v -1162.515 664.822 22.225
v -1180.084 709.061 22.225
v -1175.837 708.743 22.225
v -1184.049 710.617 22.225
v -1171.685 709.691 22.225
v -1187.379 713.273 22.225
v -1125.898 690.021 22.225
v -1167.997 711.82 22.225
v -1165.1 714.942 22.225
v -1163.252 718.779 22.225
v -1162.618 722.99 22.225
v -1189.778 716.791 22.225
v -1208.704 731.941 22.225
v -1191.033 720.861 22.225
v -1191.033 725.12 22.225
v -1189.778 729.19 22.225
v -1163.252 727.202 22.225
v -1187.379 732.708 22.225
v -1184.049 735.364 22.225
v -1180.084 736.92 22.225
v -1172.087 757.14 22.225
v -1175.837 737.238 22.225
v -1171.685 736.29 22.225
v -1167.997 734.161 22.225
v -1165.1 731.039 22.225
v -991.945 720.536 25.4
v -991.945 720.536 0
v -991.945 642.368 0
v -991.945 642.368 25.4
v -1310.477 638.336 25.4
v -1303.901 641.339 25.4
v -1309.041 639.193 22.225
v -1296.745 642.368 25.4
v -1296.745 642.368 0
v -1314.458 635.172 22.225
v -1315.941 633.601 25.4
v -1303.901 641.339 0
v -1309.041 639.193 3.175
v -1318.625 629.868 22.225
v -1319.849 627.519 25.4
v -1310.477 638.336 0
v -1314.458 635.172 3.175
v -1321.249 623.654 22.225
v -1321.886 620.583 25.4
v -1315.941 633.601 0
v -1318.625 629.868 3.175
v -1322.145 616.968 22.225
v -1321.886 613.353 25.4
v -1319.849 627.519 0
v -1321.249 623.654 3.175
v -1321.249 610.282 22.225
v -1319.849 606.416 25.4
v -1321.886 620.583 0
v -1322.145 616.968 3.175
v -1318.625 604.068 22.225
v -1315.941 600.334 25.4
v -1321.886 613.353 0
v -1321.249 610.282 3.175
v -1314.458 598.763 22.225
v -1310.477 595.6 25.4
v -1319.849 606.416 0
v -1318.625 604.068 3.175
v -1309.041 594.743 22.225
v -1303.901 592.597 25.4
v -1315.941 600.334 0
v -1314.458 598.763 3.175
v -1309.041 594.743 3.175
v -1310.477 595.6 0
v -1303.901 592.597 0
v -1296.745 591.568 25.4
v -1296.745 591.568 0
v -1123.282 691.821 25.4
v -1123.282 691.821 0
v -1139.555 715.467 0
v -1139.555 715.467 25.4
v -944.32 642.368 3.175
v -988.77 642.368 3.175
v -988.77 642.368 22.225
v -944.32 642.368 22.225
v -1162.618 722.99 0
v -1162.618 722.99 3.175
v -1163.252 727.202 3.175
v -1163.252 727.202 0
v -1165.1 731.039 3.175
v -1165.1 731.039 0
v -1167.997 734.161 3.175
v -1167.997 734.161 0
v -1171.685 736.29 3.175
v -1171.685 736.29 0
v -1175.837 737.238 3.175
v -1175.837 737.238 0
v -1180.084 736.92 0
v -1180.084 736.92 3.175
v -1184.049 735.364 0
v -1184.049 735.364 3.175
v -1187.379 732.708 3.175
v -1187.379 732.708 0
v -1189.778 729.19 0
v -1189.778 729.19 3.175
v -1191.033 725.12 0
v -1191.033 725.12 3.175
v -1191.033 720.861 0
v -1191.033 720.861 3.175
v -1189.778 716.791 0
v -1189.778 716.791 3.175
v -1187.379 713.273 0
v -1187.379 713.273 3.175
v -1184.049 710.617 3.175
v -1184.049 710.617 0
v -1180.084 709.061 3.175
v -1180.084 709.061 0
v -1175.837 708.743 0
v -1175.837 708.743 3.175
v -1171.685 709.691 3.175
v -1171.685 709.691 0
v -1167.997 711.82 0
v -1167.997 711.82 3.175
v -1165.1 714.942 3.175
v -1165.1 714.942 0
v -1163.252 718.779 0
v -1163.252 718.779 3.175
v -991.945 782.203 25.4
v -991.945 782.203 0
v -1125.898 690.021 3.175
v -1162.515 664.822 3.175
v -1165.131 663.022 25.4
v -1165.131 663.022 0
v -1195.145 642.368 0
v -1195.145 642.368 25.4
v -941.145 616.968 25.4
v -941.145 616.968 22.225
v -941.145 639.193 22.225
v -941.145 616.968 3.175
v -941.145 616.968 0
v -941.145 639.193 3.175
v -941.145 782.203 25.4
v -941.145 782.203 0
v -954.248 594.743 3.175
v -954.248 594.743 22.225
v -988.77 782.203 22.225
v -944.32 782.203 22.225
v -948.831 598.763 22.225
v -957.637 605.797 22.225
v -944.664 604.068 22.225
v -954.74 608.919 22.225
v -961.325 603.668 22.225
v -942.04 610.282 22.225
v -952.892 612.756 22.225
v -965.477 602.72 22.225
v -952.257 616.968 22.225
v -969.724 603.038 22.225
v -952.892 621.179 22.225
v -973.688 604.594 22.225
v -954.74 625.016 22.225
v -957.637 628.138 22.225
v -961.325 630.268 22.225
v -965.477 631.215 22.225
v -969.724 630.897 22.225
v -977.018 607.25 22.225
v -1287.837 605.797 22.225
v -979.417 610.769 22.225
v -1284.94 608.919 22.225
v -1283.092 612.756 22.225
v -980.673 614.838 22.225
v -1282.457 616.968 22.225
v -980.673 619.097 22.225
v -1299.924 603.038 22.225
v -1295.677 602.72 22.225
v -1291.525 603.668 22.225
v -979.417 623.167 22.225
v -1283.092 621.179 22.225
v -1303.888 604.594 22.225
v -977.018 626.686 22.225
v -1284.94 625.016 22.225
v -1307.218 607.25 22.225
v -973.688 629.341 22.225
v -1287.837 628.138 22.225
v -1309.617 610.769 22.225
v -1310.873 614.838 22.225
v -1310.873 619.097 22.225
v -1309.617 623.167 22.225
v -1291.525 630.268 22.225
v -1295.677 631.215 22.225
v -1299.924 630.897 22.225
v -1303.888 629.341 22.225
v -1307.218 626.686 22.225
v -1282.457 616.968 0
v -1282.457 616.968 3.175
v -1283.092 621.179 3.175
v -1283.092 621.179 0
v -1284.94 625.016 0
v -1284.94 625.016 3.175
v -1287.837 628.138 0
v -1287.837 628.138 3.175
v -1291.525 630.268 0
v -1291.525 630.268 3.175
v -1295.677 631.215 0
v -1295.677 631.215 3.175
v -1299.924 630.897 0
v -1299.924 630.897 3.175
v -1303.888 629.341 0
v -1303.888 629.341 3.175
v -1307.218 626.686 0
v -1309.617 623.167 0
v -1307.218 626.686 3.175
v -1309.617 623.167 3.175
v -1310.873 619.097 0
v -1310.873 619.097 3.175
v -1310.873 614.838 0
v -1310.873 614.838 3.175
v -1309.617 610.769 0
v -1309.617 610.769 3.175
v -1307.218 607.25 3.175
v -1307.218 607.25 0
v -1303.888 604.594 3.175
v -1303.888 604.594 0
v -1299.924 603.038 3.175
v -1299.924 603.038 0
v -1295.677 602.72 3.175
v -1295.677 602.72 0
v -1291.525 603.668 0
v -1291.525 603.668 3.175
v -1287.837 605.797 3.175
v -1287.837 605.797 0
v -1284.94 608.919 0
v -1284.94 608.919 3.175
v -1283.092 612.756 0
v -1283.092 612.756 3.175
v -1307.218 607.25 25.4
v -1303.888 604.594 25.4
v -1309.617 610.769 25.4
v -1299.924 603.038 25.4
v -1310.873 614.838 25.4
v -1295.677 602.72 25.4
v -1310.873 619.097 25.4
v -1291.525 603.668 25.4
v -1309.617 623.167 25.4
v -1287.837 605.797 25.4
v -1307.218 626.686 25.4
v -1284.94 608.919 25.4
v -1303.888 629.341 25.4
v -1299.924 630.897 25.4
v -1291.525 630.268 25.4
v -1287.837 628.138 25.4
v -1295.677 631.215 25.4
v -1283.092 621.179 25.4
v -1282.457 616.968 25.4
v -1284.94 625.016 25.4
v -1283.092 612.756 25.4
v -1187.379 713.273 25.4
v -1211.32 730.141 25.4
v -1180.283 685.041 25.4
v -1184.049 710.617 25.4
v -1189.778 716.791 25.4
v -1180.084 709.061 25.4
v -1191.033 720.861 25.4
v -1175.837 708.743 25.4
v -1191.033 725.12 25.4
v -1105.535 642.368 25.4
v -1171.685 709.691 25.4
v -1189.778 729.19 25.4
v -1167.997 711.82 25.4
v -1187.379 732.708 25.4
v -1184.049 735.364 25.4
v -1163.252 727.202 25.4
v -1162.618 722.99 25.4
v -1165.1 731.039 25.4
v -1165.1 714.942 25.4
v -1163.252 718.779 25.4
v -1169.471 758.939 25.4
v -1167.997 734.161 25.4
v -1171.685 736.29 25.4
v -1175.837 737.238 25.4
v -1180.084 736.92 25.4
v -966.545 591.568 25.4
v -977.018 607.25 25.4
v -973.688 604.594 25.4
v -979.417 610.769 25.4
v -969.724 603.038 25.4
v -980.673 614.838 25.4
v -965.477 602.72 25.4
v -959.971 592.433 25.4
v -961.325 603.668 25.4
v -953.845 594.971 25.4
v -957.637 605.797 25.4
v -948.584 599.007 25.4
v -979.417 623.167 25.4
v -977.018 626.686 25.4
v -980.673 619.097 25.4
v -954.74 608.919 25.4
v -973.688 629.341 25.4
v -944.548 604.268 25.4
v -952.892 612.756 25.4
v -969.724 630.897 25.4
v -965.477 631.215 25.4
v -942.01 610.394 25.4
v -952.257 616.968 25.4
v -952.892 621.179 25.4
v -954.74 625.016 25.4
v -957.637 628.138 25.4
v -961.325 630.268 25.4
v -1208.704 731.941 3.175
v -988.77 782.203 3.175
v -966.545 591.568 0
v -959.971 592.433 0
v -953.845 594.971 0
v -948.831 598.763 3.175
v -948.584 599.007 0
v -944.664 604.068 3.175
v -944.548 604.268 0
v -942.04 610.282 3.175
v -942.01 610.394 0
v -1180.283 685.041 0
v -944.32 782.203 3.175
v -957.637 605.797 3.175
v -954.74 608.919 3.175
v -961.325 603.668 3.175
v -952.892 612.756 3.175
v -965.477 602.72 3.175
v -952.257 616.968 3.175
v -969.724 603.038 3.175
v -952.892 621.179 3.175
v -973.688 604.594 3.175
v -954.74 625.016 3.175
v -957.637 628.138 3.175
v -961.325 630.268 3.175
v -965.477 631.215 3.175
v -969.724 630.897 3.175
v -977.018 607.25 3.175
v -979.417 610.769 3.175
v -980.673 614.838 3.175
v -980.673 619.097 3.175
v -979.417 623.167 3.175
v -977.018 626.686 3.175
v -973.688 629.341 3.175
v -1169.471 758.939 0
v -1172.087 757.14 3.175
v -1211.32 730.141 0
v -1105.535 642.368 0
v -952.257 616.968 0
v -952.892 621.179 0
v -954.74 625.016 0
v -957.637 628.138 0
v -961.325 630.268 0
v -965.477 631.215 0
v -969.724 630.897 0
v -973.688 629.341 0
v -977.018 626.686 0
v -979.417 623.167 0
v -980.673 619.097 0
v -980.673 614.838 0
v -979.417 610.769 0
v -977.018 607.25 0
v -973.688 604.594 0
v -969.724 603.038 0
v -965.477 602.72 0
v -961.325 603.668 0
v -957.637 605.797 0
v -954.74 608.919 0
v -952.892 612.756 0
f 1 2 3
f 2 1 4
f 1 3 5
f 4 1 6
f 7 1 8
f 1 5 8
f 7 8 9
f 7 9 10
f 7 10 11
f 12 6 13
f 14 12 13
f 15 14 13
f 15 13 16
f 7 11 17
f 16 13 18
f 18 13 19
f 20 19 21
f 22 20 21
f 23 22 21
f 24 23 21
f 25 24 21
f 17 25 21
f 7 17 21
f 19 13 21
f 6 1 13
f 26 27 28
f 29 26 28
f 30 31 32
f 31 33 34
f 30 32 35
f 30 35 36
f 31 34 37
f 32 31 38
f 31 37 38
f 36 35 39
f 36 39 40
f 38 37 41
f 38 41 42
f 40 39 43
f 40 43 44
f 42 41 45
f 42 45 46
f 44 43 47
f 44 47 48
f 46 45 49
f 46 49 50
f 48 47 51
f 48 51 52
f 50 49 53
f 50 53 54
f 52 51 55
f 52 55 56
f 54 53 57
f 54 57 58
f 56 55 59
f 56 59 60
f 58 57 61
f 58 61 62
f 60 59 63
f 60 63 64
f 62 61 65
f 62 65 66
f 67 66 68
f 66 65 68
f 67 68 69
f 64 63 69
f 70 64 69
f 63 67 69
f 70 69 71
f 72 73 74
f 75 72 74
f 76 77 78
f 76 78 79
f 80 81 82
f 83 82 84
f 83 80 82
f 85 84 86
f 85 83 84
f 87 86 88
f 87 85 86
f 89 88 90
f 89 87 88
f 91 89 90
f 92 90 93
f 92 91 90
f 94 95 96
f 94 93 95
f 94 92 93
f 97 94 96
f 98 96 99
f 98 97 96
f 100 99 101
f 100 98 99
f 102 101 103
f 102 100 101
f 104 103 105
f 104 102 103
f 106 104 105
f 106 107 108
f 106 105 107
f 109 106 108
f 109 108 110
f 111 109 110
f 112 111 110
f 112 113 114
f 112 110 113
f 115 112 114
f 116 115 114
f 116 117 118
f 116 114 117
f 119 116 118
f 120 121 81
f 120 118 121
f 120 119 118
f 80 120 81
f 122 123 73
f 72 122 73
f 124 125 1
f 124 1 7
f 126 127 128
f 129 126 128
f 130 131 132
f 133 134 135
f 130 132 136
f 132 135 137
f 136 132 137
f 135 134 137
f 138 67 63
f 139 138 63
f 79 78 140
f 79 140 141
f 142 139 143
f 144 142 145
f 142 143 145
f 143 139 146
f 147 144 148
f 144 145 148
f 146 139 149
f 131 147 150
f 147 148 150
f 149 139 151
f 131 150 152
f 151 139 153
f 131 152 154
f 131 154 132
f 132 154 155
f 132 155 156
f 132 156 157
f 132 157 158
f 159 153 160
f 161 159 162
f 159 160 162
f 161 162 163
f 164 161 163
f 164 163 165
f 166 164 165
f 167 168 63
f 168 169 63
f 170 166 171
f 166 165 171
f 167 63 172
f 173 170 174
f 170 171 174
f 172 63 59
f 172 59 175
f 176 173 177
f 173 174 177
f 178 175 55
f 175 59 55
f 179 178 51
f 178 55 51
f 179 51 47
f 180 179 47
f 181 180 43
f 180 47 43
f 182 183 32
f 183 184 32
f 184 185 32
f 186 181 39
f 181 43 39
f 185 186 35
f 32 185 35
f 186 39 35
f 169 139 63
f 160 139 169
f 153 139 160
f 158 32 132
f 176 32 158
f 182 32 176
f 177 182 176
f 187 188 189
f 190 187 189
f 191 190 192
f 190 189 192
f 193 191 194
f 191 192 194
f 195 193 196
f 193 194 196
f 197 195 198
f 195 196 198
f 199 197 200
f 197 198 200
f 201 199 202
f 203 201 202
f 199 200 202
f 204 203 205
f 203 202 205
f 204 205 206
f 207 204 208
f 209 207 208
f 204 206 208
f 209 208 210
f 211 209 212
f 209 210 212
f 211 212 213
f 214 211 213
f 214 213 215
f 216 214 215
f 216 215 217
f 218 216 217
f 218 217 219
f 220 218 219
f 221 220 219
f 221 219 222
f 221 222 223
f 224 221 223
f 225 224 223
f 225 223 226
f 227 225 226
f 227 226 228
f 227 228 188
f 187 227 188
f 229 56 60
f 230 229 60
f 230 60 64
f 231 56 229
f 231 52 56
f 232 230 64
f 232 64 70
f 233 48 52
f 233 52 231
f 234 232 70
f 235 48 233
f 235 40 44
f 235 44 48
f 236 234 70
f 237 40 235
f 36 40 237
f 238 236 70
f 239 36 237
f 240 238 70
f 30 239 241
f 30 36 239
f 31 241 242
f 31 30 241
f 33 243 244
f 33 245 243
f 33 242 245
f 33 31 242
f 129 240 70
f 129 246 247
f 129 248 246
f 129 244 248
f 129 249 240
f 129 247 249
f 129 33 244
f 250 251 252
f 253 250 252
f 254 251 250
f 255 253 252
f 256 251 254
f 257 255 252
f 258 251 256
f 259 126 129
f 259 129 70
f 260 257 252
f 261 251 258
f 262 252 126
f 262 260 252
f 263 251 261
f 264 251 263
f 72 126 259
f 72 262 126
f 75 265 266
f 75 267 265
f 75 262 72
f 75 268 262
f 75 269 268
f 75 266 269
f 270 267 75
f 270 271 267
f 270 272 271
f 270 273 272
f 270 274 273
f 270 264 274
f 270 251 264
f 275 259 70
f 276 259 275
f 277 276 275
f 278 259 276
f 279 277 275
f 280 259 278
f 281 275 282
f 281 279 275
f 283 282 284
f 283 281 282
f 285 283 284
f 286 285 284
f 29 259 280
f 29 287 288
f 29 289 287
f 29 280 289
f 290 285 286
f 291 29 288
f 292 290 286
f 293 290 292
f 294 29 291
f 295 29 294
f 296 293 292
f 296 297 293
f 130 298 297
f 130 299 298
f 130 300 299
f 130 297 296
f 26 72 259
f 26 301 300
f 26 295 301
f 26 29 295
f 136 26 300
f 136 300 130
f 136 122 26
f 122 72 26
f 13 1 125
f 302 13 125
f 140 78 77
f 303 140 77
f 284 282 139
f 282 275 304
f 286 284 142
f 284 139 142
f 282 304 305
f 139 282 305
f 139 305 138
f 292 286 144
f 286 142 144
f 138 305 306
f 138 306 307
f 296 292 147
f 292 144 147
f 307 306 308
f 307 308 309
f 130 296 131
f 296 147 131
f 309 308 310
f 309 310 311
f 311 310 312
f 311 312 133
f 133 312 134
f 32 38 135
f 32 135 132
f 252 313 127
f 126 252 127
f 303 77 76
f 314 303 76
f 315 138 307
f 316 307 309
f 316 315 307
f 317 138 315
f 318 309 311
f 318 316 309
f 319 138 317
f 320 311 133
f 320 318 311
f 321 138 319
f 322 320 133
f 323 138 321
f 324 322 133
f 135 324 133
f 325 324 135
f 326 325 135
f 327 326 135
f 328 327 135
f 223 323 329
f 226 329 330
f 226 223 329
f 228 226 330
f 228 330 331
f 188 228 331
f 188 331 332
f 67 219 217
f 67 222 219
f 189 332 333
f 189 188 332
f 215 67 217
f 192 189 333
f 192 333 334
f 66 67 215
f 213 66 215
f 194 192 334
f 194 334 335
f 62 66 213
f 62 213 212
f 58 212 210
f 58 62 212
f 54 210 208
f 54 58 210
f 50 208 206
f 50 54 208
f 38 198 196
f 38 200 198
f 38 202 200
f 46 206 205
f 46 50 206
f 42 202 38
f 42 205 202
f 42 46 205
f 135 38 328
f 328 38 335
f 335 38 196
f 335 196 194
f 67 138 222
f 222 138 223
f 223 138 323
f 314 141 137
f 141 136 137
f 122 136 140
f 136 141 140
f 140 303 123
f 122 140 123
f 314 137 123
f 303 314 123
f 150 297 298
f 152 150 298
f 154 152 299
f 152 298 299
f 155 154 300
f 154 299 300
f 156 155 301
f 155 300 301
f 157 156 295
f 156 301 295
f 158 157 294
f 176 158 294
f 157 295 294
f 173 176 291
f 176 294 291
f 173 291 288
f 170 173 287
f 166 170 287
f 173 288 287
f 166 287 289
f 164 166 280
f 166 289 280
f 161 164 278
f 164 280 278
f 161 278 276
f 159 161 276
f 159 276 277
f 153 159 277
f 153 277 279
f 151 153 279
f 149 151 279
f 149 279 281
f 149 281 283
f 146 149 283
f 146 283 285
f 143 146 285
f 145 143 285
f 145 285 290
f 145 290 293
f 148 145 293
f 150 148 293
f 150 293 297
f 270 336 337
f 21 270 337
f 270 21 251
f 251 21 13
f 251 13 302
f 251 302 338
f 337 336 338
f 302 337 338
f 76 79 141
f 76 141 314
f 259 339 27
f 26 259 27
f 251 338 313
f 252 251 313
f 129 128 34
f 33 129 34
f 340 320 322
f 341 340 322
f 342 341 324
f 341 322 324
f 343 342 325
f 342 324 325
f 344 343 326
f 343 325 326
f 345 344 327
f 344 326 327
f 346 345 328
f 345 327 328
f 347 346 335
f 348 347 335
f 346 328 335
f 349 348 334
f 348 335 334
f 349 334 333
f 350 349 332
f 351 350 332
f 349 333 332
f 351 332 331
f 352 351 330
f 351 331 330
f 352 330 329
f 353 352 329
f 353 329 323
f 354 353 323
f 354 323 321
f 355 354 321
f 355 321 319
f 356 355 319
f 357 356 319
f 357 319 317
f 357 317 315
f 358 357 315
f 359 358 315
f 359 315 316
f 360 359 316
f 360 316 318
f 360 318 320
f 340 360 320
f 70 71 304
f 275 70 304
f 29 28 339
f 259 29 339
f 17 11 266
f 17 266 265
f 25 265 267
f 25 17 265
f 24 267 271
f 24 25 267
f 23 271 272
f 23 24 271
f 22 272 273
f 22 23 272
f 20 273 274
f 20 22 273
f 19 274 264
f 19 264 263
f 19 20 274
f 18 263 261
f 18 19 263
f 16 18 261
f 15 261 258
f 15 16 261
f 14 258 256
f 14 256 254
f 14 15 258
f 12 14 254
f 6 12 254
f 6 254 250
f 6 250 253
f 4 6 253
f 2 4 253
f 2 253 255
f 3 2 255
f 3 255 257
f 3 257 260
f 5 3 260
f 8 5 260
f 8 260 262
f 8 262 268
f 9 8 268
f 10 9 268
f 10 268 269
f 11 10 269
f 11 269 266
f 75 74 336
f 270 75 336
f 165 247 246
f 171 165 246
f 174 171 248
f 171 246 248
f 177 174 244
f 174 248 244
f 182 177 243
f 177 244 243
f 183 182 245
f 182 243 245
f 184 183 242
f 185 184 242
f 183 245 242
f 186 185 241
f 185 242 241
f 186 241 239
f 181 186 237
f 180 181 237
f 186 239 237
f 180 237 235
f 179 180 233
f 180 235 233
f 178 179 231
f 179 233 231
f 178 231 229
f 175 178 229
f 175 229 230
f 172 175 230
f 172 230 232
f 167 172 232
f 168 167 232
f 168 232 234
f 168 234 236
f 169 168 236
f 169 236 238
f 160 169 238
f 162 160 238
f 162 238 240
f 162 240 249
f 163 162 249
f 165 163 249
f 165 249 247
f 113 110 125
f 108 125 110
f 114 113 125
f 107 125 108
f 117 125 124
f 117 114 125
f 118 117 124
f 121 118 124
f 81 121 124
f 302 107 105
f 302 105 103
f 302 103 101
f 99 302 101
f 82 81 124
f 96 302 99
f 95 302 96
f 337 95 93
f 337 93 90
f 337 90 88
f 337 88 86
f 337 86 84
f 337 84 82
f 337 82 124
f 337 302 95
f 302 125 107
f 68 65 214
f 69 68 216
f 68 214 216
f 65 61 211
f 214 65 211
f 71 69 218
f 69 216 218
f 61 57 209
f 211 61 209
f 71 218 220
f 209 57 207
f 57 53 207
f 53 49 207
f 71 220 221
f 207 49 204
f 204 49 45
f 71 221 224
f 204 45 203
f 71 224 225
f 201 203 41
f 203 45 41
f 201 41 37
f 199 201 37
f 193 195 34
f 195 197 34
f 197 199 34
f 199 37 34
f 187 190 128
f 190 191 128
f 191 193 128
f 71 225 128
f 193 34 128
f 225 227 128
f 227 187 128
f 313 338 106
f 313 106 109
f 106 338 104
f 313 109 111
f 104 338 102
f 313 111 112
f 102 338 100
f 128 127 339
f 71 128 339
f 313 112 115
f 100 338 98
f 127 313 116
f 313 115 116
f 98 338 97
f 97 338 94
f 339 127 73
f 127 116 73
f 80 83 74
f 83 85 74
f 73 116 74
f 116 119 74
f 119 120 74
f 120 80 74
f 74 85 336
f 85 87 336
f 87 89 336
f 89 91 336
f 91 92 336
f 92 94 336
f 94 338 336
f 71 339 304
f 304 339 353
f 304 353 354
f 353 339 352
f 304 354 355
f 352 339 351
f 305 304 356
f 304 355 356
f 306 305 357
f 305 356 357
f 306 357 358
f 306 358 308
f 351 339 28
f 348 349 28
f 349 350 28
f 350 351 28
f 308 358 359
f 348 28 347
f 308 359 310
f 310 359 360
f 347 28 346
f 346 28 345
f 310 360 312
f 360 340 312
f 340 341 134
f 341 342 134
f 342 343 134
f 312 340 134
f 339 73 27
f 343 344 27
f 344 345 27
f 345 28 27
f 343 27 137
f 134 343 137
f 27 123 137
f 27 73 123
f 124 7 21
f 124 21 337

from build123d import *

# Parameters (mm, degrees)
SKETCH1_R           = 14.2875
SKETCH1_R_2         = 25.4
BOSS_EXTRUDE3_DEPTH = 25.4
SKETCH9_R           = 14.2875
CUT_EXTRUDE7_DEPTH  = 1537.409158581
SKETCH10_W          = 19.05
SKETCH10_H          = 44.45
CUT_EXTRUDE8_DEPTH  = 871.429558372
SKETCH11_W          = 44.45
SKETCH11_H          = 19.05
CUT_EXTRUDE9_DEPTH  = 139.835175171
SKETCH13_R          = 14.2875
BOSS_EXTRUDE4_DEPTH = 25.4
SKETCH14_W          = 44.45
SKETCH14_H          = 19.05
CUT_EXTRUDE10_DEPTH = 81.475845846
FILLET3_R           = 25.4


with BuildPart() as part:
    # Sketch1 → Boss-Extrude3 (new body)
    # profile 1 of 13: a face of its own
    with BuildSketch(Plane.XY):
        with BuildLine():
            ThreePointArc((-1322.144654144, 616.967775532), (-1314.705166386, 634.928287774), (-1296.744654144, 642.367775532))
            Line((-1296.744654144, 642.367775532), (-1322.144654144, 642.367775532))
            Line((-1322.144654144, 642.367775532), (-1322.144654144, 616.967775532))
        make_face()
    # profile 2 of 13: a face of its own
    with BuildSketch(Plane.XY):
        with BuildLine():
            ThreePointArc((-1296.744654144, 591.567775532), (-1314.705166386, 599.00726329), (-1322.144654144, 616.967775532))
            Line((-1322.144654144, 616.967775532), (-1322.144654144, 591.567775532))
            Line((-1322.144654144, 591.567775532), (-1296.744654144, 591.567775532))
        make_face()
    # profile 3 of 13: a face of its own
    with BuildSketch(Plane.XY):
        with BuildLine():
            ThreePointArc((-1258.644654144, 616.967775532), (-1261.152687268, 630.562697152), (-1268.34659083, 642.367775532))
            Line((-1268.34659083, 642.367775532), (-1296.744654144, 642.367775532))
            ThreePointArc((-1296.744654144, 642.367775532), (-1278.784141902, 634.928287774), (-1271.344654144, 616.967775532))
            ThreePointArc((-1271.344654144, 616.967775532), (-1278.784141902, 599.00726329), (-1296.744654144, 591.567775532))
            Line((-1296.744654144, 591.567775532), (-1268.34659083, 591.567775532))
            ThreePointArc((-1268.34659083, 591.567775532), (-1261.152687268, 603.372853911), (-1258.644654144, 616.967775532))
        make_face()
    # profile 4 of 13: a face of its own
    with BuildSketch(Plane.XY):
        with BuildLine():
            Line((-1166.346089039, 600.519446439), (-1195.144654144, 642.367775532))
            Line((-1195.144654144, 642.367775532), (-1268.34659083, 642.367775532))
            ThreePointArc((-1268.34659083, 642.367775532), (-1261.152687268, 630.562697152), (-1258.644654144, 616.967775532))
            ThreePointArc((-1258.644654144, 616.967775532), (-1261.152687268, 603.372853911), (-1268.34659083, 591.567775532))
            Line((-1268.34659083, 591.567775532), (-1128.284013271, 591.567775532))
            Line((-1128.284013271, 591.567775532), (-1128.284013271, 626.712443646))
            Line((-1128.284013271, 626.712443646), (-1166.346089039, 600.519446439))
        make_face()
    # profile 5 of 13: a face of its own
    with BuildSketch(Plane.XY):
        Polygon((-1128.284013271, 642.367775532), (-1195.144654144, 642.367775532), (-1166.346089039, 600.519446439), (-1128.284013271, 626.712443646), align=None)
    # profile 6 of 13: a face of its own
    with BuildSketch(Plane.XY):
        Polygon((-991.944654144, 720.536450369), (-991.944654144, 782.202950703), (-1195.144654144, 642.367775532), (-1128.284013271, 642.367775532), (-1105.534633972, 642.367775532), align=None)
    # profile 7 of 13: a face of its own
    with BuildSketch(Plane.XY):
        Polygon((-1105.534633972, 642.367775532), (-1128.284013271, 642.367775532), (-1128.284013271, 626.712443646), align=None)
    # profile 8 of 13: a face of its own
    with BuildSketch(Plane.XY):
        Polygon((-941.144654144, 591.567775532), (-941.144654144, 642.367775532), (-991.944654144, 642.367775532), (-1105.534633972, 642.367775532), (-1128.284013271, 626.712443646), (-1128.284013271, 591.567775532), align=None)
        with Locations((-966.544654144, 616.967775532)):
            Circle(SKETCH1_R, mode=Mode.SUBTRACT)
    # profile 9 of 13: a face of its own
    with BuildSketch(Plane.XY):
        Polygon((-941.144654144, 782.202950703), (-991.944654144, 782.202950703), (-963.146089039, 740.354621609), (-991.944654144, 720.536450369), (-991.944654144, 642.367775532), (-941.144654144, 642.367775532), align=None)
    # profile 10 of 13: a face of its own
    with BuildSketch(Plane.XY):
        Polygon((-963.146089039, 740.354621609), (-991.944654144, 782.202950703), (-991.944654144, 720.536450369), align=None)
    # profile 11 of 13: a face of its own
    with BuildSketch(Plane.XY):
        with Locations((-966.544654144, 616.967775532)):
            Circle(SKETCH1_R)
    # profile 12 of 13: a face of its own
    with BuildSketch(Plane.XY):
        with Locations((-1296.744654144, 616.967775532)):
            Circle(SKETCH1_R_2)
        with Locations((-1296.744654144, 616.967775532)):
            Circle(SKETCH1_R, mode=Mode.SUBTRACT)
    # profile 13 of 13: a face of its own
    with BuildSketch(Plane.XY):
        with Locations((-1296.744654144, 616.967775532)):
            Circle(SKETCH1_R)
    extrude(amount=BOSS_EXTRUDE3_DEPTH)

    # Sketch9 → Cut-Extrude7 (cut, through all)
    with BuildSketch(Plane.XY.offset(25.4)):
        with Locations((-1296.744654144, 616.967775532)):
            Circle(SKETCH9_R)
        with Locations((-966.544654144, 616.967775532)):
            Circle(SKETCH9_R)
    extrude(amount=-CUT_EXTRUDE7_DEPTH, mode=Mode.SUBTRACT)

    # Sketch10 → Cut-Extrude8 (cut, through all)
    with BuildSketch(Plane.ZY.offset(1322.144654144)):
        with Locations((12.7, 616.967775532)):
            Rectangle(SKETCH10_W, SKETCH10_H)
    extrude(amount=-CUT_EXTRUDE8_DEPTH, mode=Mode.SUBTRACT)

    # Sketch11 → Cut-Extrude9 (cut)
    with BuildSketch(Plane(origin=(0, 782.202950703, 0), x_dir=(1, 0, 0), z_dir=(0, 1, 0))):
        with Locations((-966.544654144, -12.7)):
            Rectangle(SKETCH11_W, SKETCH11_H)
    extrude(amount=-CUT_EXTRUDE9_DEPTH, mode=Mode.SUBTRACT)

    # Sketch13 → Boss-Extrude4 (add)
    # profile 1 of 2: a face of its own
    with BuildSketch(Plane.XY):
        with BuildLine():
            Line((-1169.471208218, 758.939487681), (-1211.319537311, 730.140922576))
            Line((-1211.319537311, 730.140922576), (-1180.283016907, 685.040532503))
            ThreePointArc((-1180.283016907, 685.040532503), (-1154.1022052, 692.46774594), (-1139.555223473, 715.467392104))
            Line((-1139.555223473, 715.467392104), (-1169.471208218, 758.939487681))
        make_face()
        with Locations((-1176.905095286, 722.990494894)):
            Circle(SKETCH13_R, mode=Mode.SUBTRACT)
    # profile 2 of 2: a face of its own
    with BuildSketch(Plane.XY):
        with BuildLine():
            ThreePointArc((-1139.555223473, 715.467392104), (-1154.1022052, 692.46774594), (-1180.283016907, 685.040532503))
            Line((-1180.283016907, 685.040532503), (-1165.130807959, 663.022260959))
            Line((-1165.130807959, 663.022260959), (-1123.282478866, 691.820826065))
            Line((-1123.282478866, 691.820826065), (-1139.555223473, 715.467392104))
        make_face()
    extrude(amount=BOSS_EXTRUDE4_DEPTH)

    # Sketch14 → Cut-Extrude10 (cut)
    with BuildSketch(Plane(origin=(-730.269249407, 1061.183005622, 0), x_dir=(0.8237860057708082, 0.5669008878950341, 0), z_dir=(-0.5669008878950341, 0.8237860057708082, 0))):
        with Locations((-558.550546057, -12.7)):
            Rectangle(SKETCH14_W, SKETCH14_H)
    extrude(amount=-CUT_EXTRUDE10_DEPTH, mode=Mode.SUBTRACT)

    # Fillet3
    # the kernel refuses this fillet: 25.4 mm, written as the material it takes off along each edge
    with BuildSketch(Plane(origin=(-941.144654144, 591.567775532, -63.5), x_dir=(-1, 0, 0), z_dir=(0, 0, 1)), Plane(origin=(-1322.144654144, 591.567775532, -63.5), x_dir=(0, 1, 0), z_dir=(0, 0, 1)), Plane(origin=(-1322.144654144, 642.367775532, -63.5), x_dir=(1, 0, 0), z_dir=(0, 0, 1))) as fillet3_piece_1:
        with BuildLine():
            CenterArc((FILLET3_R, -FILLET3_R), FILLET3_R, 90, 90)
            Line((0, -FILLET3_R), (0, 0))
            Line((0, 0), (FILLET3_R, 0))
        make_face()
    extrude(amount=152.4, mode=Mode.SUBTRACT)


solid = part.part
